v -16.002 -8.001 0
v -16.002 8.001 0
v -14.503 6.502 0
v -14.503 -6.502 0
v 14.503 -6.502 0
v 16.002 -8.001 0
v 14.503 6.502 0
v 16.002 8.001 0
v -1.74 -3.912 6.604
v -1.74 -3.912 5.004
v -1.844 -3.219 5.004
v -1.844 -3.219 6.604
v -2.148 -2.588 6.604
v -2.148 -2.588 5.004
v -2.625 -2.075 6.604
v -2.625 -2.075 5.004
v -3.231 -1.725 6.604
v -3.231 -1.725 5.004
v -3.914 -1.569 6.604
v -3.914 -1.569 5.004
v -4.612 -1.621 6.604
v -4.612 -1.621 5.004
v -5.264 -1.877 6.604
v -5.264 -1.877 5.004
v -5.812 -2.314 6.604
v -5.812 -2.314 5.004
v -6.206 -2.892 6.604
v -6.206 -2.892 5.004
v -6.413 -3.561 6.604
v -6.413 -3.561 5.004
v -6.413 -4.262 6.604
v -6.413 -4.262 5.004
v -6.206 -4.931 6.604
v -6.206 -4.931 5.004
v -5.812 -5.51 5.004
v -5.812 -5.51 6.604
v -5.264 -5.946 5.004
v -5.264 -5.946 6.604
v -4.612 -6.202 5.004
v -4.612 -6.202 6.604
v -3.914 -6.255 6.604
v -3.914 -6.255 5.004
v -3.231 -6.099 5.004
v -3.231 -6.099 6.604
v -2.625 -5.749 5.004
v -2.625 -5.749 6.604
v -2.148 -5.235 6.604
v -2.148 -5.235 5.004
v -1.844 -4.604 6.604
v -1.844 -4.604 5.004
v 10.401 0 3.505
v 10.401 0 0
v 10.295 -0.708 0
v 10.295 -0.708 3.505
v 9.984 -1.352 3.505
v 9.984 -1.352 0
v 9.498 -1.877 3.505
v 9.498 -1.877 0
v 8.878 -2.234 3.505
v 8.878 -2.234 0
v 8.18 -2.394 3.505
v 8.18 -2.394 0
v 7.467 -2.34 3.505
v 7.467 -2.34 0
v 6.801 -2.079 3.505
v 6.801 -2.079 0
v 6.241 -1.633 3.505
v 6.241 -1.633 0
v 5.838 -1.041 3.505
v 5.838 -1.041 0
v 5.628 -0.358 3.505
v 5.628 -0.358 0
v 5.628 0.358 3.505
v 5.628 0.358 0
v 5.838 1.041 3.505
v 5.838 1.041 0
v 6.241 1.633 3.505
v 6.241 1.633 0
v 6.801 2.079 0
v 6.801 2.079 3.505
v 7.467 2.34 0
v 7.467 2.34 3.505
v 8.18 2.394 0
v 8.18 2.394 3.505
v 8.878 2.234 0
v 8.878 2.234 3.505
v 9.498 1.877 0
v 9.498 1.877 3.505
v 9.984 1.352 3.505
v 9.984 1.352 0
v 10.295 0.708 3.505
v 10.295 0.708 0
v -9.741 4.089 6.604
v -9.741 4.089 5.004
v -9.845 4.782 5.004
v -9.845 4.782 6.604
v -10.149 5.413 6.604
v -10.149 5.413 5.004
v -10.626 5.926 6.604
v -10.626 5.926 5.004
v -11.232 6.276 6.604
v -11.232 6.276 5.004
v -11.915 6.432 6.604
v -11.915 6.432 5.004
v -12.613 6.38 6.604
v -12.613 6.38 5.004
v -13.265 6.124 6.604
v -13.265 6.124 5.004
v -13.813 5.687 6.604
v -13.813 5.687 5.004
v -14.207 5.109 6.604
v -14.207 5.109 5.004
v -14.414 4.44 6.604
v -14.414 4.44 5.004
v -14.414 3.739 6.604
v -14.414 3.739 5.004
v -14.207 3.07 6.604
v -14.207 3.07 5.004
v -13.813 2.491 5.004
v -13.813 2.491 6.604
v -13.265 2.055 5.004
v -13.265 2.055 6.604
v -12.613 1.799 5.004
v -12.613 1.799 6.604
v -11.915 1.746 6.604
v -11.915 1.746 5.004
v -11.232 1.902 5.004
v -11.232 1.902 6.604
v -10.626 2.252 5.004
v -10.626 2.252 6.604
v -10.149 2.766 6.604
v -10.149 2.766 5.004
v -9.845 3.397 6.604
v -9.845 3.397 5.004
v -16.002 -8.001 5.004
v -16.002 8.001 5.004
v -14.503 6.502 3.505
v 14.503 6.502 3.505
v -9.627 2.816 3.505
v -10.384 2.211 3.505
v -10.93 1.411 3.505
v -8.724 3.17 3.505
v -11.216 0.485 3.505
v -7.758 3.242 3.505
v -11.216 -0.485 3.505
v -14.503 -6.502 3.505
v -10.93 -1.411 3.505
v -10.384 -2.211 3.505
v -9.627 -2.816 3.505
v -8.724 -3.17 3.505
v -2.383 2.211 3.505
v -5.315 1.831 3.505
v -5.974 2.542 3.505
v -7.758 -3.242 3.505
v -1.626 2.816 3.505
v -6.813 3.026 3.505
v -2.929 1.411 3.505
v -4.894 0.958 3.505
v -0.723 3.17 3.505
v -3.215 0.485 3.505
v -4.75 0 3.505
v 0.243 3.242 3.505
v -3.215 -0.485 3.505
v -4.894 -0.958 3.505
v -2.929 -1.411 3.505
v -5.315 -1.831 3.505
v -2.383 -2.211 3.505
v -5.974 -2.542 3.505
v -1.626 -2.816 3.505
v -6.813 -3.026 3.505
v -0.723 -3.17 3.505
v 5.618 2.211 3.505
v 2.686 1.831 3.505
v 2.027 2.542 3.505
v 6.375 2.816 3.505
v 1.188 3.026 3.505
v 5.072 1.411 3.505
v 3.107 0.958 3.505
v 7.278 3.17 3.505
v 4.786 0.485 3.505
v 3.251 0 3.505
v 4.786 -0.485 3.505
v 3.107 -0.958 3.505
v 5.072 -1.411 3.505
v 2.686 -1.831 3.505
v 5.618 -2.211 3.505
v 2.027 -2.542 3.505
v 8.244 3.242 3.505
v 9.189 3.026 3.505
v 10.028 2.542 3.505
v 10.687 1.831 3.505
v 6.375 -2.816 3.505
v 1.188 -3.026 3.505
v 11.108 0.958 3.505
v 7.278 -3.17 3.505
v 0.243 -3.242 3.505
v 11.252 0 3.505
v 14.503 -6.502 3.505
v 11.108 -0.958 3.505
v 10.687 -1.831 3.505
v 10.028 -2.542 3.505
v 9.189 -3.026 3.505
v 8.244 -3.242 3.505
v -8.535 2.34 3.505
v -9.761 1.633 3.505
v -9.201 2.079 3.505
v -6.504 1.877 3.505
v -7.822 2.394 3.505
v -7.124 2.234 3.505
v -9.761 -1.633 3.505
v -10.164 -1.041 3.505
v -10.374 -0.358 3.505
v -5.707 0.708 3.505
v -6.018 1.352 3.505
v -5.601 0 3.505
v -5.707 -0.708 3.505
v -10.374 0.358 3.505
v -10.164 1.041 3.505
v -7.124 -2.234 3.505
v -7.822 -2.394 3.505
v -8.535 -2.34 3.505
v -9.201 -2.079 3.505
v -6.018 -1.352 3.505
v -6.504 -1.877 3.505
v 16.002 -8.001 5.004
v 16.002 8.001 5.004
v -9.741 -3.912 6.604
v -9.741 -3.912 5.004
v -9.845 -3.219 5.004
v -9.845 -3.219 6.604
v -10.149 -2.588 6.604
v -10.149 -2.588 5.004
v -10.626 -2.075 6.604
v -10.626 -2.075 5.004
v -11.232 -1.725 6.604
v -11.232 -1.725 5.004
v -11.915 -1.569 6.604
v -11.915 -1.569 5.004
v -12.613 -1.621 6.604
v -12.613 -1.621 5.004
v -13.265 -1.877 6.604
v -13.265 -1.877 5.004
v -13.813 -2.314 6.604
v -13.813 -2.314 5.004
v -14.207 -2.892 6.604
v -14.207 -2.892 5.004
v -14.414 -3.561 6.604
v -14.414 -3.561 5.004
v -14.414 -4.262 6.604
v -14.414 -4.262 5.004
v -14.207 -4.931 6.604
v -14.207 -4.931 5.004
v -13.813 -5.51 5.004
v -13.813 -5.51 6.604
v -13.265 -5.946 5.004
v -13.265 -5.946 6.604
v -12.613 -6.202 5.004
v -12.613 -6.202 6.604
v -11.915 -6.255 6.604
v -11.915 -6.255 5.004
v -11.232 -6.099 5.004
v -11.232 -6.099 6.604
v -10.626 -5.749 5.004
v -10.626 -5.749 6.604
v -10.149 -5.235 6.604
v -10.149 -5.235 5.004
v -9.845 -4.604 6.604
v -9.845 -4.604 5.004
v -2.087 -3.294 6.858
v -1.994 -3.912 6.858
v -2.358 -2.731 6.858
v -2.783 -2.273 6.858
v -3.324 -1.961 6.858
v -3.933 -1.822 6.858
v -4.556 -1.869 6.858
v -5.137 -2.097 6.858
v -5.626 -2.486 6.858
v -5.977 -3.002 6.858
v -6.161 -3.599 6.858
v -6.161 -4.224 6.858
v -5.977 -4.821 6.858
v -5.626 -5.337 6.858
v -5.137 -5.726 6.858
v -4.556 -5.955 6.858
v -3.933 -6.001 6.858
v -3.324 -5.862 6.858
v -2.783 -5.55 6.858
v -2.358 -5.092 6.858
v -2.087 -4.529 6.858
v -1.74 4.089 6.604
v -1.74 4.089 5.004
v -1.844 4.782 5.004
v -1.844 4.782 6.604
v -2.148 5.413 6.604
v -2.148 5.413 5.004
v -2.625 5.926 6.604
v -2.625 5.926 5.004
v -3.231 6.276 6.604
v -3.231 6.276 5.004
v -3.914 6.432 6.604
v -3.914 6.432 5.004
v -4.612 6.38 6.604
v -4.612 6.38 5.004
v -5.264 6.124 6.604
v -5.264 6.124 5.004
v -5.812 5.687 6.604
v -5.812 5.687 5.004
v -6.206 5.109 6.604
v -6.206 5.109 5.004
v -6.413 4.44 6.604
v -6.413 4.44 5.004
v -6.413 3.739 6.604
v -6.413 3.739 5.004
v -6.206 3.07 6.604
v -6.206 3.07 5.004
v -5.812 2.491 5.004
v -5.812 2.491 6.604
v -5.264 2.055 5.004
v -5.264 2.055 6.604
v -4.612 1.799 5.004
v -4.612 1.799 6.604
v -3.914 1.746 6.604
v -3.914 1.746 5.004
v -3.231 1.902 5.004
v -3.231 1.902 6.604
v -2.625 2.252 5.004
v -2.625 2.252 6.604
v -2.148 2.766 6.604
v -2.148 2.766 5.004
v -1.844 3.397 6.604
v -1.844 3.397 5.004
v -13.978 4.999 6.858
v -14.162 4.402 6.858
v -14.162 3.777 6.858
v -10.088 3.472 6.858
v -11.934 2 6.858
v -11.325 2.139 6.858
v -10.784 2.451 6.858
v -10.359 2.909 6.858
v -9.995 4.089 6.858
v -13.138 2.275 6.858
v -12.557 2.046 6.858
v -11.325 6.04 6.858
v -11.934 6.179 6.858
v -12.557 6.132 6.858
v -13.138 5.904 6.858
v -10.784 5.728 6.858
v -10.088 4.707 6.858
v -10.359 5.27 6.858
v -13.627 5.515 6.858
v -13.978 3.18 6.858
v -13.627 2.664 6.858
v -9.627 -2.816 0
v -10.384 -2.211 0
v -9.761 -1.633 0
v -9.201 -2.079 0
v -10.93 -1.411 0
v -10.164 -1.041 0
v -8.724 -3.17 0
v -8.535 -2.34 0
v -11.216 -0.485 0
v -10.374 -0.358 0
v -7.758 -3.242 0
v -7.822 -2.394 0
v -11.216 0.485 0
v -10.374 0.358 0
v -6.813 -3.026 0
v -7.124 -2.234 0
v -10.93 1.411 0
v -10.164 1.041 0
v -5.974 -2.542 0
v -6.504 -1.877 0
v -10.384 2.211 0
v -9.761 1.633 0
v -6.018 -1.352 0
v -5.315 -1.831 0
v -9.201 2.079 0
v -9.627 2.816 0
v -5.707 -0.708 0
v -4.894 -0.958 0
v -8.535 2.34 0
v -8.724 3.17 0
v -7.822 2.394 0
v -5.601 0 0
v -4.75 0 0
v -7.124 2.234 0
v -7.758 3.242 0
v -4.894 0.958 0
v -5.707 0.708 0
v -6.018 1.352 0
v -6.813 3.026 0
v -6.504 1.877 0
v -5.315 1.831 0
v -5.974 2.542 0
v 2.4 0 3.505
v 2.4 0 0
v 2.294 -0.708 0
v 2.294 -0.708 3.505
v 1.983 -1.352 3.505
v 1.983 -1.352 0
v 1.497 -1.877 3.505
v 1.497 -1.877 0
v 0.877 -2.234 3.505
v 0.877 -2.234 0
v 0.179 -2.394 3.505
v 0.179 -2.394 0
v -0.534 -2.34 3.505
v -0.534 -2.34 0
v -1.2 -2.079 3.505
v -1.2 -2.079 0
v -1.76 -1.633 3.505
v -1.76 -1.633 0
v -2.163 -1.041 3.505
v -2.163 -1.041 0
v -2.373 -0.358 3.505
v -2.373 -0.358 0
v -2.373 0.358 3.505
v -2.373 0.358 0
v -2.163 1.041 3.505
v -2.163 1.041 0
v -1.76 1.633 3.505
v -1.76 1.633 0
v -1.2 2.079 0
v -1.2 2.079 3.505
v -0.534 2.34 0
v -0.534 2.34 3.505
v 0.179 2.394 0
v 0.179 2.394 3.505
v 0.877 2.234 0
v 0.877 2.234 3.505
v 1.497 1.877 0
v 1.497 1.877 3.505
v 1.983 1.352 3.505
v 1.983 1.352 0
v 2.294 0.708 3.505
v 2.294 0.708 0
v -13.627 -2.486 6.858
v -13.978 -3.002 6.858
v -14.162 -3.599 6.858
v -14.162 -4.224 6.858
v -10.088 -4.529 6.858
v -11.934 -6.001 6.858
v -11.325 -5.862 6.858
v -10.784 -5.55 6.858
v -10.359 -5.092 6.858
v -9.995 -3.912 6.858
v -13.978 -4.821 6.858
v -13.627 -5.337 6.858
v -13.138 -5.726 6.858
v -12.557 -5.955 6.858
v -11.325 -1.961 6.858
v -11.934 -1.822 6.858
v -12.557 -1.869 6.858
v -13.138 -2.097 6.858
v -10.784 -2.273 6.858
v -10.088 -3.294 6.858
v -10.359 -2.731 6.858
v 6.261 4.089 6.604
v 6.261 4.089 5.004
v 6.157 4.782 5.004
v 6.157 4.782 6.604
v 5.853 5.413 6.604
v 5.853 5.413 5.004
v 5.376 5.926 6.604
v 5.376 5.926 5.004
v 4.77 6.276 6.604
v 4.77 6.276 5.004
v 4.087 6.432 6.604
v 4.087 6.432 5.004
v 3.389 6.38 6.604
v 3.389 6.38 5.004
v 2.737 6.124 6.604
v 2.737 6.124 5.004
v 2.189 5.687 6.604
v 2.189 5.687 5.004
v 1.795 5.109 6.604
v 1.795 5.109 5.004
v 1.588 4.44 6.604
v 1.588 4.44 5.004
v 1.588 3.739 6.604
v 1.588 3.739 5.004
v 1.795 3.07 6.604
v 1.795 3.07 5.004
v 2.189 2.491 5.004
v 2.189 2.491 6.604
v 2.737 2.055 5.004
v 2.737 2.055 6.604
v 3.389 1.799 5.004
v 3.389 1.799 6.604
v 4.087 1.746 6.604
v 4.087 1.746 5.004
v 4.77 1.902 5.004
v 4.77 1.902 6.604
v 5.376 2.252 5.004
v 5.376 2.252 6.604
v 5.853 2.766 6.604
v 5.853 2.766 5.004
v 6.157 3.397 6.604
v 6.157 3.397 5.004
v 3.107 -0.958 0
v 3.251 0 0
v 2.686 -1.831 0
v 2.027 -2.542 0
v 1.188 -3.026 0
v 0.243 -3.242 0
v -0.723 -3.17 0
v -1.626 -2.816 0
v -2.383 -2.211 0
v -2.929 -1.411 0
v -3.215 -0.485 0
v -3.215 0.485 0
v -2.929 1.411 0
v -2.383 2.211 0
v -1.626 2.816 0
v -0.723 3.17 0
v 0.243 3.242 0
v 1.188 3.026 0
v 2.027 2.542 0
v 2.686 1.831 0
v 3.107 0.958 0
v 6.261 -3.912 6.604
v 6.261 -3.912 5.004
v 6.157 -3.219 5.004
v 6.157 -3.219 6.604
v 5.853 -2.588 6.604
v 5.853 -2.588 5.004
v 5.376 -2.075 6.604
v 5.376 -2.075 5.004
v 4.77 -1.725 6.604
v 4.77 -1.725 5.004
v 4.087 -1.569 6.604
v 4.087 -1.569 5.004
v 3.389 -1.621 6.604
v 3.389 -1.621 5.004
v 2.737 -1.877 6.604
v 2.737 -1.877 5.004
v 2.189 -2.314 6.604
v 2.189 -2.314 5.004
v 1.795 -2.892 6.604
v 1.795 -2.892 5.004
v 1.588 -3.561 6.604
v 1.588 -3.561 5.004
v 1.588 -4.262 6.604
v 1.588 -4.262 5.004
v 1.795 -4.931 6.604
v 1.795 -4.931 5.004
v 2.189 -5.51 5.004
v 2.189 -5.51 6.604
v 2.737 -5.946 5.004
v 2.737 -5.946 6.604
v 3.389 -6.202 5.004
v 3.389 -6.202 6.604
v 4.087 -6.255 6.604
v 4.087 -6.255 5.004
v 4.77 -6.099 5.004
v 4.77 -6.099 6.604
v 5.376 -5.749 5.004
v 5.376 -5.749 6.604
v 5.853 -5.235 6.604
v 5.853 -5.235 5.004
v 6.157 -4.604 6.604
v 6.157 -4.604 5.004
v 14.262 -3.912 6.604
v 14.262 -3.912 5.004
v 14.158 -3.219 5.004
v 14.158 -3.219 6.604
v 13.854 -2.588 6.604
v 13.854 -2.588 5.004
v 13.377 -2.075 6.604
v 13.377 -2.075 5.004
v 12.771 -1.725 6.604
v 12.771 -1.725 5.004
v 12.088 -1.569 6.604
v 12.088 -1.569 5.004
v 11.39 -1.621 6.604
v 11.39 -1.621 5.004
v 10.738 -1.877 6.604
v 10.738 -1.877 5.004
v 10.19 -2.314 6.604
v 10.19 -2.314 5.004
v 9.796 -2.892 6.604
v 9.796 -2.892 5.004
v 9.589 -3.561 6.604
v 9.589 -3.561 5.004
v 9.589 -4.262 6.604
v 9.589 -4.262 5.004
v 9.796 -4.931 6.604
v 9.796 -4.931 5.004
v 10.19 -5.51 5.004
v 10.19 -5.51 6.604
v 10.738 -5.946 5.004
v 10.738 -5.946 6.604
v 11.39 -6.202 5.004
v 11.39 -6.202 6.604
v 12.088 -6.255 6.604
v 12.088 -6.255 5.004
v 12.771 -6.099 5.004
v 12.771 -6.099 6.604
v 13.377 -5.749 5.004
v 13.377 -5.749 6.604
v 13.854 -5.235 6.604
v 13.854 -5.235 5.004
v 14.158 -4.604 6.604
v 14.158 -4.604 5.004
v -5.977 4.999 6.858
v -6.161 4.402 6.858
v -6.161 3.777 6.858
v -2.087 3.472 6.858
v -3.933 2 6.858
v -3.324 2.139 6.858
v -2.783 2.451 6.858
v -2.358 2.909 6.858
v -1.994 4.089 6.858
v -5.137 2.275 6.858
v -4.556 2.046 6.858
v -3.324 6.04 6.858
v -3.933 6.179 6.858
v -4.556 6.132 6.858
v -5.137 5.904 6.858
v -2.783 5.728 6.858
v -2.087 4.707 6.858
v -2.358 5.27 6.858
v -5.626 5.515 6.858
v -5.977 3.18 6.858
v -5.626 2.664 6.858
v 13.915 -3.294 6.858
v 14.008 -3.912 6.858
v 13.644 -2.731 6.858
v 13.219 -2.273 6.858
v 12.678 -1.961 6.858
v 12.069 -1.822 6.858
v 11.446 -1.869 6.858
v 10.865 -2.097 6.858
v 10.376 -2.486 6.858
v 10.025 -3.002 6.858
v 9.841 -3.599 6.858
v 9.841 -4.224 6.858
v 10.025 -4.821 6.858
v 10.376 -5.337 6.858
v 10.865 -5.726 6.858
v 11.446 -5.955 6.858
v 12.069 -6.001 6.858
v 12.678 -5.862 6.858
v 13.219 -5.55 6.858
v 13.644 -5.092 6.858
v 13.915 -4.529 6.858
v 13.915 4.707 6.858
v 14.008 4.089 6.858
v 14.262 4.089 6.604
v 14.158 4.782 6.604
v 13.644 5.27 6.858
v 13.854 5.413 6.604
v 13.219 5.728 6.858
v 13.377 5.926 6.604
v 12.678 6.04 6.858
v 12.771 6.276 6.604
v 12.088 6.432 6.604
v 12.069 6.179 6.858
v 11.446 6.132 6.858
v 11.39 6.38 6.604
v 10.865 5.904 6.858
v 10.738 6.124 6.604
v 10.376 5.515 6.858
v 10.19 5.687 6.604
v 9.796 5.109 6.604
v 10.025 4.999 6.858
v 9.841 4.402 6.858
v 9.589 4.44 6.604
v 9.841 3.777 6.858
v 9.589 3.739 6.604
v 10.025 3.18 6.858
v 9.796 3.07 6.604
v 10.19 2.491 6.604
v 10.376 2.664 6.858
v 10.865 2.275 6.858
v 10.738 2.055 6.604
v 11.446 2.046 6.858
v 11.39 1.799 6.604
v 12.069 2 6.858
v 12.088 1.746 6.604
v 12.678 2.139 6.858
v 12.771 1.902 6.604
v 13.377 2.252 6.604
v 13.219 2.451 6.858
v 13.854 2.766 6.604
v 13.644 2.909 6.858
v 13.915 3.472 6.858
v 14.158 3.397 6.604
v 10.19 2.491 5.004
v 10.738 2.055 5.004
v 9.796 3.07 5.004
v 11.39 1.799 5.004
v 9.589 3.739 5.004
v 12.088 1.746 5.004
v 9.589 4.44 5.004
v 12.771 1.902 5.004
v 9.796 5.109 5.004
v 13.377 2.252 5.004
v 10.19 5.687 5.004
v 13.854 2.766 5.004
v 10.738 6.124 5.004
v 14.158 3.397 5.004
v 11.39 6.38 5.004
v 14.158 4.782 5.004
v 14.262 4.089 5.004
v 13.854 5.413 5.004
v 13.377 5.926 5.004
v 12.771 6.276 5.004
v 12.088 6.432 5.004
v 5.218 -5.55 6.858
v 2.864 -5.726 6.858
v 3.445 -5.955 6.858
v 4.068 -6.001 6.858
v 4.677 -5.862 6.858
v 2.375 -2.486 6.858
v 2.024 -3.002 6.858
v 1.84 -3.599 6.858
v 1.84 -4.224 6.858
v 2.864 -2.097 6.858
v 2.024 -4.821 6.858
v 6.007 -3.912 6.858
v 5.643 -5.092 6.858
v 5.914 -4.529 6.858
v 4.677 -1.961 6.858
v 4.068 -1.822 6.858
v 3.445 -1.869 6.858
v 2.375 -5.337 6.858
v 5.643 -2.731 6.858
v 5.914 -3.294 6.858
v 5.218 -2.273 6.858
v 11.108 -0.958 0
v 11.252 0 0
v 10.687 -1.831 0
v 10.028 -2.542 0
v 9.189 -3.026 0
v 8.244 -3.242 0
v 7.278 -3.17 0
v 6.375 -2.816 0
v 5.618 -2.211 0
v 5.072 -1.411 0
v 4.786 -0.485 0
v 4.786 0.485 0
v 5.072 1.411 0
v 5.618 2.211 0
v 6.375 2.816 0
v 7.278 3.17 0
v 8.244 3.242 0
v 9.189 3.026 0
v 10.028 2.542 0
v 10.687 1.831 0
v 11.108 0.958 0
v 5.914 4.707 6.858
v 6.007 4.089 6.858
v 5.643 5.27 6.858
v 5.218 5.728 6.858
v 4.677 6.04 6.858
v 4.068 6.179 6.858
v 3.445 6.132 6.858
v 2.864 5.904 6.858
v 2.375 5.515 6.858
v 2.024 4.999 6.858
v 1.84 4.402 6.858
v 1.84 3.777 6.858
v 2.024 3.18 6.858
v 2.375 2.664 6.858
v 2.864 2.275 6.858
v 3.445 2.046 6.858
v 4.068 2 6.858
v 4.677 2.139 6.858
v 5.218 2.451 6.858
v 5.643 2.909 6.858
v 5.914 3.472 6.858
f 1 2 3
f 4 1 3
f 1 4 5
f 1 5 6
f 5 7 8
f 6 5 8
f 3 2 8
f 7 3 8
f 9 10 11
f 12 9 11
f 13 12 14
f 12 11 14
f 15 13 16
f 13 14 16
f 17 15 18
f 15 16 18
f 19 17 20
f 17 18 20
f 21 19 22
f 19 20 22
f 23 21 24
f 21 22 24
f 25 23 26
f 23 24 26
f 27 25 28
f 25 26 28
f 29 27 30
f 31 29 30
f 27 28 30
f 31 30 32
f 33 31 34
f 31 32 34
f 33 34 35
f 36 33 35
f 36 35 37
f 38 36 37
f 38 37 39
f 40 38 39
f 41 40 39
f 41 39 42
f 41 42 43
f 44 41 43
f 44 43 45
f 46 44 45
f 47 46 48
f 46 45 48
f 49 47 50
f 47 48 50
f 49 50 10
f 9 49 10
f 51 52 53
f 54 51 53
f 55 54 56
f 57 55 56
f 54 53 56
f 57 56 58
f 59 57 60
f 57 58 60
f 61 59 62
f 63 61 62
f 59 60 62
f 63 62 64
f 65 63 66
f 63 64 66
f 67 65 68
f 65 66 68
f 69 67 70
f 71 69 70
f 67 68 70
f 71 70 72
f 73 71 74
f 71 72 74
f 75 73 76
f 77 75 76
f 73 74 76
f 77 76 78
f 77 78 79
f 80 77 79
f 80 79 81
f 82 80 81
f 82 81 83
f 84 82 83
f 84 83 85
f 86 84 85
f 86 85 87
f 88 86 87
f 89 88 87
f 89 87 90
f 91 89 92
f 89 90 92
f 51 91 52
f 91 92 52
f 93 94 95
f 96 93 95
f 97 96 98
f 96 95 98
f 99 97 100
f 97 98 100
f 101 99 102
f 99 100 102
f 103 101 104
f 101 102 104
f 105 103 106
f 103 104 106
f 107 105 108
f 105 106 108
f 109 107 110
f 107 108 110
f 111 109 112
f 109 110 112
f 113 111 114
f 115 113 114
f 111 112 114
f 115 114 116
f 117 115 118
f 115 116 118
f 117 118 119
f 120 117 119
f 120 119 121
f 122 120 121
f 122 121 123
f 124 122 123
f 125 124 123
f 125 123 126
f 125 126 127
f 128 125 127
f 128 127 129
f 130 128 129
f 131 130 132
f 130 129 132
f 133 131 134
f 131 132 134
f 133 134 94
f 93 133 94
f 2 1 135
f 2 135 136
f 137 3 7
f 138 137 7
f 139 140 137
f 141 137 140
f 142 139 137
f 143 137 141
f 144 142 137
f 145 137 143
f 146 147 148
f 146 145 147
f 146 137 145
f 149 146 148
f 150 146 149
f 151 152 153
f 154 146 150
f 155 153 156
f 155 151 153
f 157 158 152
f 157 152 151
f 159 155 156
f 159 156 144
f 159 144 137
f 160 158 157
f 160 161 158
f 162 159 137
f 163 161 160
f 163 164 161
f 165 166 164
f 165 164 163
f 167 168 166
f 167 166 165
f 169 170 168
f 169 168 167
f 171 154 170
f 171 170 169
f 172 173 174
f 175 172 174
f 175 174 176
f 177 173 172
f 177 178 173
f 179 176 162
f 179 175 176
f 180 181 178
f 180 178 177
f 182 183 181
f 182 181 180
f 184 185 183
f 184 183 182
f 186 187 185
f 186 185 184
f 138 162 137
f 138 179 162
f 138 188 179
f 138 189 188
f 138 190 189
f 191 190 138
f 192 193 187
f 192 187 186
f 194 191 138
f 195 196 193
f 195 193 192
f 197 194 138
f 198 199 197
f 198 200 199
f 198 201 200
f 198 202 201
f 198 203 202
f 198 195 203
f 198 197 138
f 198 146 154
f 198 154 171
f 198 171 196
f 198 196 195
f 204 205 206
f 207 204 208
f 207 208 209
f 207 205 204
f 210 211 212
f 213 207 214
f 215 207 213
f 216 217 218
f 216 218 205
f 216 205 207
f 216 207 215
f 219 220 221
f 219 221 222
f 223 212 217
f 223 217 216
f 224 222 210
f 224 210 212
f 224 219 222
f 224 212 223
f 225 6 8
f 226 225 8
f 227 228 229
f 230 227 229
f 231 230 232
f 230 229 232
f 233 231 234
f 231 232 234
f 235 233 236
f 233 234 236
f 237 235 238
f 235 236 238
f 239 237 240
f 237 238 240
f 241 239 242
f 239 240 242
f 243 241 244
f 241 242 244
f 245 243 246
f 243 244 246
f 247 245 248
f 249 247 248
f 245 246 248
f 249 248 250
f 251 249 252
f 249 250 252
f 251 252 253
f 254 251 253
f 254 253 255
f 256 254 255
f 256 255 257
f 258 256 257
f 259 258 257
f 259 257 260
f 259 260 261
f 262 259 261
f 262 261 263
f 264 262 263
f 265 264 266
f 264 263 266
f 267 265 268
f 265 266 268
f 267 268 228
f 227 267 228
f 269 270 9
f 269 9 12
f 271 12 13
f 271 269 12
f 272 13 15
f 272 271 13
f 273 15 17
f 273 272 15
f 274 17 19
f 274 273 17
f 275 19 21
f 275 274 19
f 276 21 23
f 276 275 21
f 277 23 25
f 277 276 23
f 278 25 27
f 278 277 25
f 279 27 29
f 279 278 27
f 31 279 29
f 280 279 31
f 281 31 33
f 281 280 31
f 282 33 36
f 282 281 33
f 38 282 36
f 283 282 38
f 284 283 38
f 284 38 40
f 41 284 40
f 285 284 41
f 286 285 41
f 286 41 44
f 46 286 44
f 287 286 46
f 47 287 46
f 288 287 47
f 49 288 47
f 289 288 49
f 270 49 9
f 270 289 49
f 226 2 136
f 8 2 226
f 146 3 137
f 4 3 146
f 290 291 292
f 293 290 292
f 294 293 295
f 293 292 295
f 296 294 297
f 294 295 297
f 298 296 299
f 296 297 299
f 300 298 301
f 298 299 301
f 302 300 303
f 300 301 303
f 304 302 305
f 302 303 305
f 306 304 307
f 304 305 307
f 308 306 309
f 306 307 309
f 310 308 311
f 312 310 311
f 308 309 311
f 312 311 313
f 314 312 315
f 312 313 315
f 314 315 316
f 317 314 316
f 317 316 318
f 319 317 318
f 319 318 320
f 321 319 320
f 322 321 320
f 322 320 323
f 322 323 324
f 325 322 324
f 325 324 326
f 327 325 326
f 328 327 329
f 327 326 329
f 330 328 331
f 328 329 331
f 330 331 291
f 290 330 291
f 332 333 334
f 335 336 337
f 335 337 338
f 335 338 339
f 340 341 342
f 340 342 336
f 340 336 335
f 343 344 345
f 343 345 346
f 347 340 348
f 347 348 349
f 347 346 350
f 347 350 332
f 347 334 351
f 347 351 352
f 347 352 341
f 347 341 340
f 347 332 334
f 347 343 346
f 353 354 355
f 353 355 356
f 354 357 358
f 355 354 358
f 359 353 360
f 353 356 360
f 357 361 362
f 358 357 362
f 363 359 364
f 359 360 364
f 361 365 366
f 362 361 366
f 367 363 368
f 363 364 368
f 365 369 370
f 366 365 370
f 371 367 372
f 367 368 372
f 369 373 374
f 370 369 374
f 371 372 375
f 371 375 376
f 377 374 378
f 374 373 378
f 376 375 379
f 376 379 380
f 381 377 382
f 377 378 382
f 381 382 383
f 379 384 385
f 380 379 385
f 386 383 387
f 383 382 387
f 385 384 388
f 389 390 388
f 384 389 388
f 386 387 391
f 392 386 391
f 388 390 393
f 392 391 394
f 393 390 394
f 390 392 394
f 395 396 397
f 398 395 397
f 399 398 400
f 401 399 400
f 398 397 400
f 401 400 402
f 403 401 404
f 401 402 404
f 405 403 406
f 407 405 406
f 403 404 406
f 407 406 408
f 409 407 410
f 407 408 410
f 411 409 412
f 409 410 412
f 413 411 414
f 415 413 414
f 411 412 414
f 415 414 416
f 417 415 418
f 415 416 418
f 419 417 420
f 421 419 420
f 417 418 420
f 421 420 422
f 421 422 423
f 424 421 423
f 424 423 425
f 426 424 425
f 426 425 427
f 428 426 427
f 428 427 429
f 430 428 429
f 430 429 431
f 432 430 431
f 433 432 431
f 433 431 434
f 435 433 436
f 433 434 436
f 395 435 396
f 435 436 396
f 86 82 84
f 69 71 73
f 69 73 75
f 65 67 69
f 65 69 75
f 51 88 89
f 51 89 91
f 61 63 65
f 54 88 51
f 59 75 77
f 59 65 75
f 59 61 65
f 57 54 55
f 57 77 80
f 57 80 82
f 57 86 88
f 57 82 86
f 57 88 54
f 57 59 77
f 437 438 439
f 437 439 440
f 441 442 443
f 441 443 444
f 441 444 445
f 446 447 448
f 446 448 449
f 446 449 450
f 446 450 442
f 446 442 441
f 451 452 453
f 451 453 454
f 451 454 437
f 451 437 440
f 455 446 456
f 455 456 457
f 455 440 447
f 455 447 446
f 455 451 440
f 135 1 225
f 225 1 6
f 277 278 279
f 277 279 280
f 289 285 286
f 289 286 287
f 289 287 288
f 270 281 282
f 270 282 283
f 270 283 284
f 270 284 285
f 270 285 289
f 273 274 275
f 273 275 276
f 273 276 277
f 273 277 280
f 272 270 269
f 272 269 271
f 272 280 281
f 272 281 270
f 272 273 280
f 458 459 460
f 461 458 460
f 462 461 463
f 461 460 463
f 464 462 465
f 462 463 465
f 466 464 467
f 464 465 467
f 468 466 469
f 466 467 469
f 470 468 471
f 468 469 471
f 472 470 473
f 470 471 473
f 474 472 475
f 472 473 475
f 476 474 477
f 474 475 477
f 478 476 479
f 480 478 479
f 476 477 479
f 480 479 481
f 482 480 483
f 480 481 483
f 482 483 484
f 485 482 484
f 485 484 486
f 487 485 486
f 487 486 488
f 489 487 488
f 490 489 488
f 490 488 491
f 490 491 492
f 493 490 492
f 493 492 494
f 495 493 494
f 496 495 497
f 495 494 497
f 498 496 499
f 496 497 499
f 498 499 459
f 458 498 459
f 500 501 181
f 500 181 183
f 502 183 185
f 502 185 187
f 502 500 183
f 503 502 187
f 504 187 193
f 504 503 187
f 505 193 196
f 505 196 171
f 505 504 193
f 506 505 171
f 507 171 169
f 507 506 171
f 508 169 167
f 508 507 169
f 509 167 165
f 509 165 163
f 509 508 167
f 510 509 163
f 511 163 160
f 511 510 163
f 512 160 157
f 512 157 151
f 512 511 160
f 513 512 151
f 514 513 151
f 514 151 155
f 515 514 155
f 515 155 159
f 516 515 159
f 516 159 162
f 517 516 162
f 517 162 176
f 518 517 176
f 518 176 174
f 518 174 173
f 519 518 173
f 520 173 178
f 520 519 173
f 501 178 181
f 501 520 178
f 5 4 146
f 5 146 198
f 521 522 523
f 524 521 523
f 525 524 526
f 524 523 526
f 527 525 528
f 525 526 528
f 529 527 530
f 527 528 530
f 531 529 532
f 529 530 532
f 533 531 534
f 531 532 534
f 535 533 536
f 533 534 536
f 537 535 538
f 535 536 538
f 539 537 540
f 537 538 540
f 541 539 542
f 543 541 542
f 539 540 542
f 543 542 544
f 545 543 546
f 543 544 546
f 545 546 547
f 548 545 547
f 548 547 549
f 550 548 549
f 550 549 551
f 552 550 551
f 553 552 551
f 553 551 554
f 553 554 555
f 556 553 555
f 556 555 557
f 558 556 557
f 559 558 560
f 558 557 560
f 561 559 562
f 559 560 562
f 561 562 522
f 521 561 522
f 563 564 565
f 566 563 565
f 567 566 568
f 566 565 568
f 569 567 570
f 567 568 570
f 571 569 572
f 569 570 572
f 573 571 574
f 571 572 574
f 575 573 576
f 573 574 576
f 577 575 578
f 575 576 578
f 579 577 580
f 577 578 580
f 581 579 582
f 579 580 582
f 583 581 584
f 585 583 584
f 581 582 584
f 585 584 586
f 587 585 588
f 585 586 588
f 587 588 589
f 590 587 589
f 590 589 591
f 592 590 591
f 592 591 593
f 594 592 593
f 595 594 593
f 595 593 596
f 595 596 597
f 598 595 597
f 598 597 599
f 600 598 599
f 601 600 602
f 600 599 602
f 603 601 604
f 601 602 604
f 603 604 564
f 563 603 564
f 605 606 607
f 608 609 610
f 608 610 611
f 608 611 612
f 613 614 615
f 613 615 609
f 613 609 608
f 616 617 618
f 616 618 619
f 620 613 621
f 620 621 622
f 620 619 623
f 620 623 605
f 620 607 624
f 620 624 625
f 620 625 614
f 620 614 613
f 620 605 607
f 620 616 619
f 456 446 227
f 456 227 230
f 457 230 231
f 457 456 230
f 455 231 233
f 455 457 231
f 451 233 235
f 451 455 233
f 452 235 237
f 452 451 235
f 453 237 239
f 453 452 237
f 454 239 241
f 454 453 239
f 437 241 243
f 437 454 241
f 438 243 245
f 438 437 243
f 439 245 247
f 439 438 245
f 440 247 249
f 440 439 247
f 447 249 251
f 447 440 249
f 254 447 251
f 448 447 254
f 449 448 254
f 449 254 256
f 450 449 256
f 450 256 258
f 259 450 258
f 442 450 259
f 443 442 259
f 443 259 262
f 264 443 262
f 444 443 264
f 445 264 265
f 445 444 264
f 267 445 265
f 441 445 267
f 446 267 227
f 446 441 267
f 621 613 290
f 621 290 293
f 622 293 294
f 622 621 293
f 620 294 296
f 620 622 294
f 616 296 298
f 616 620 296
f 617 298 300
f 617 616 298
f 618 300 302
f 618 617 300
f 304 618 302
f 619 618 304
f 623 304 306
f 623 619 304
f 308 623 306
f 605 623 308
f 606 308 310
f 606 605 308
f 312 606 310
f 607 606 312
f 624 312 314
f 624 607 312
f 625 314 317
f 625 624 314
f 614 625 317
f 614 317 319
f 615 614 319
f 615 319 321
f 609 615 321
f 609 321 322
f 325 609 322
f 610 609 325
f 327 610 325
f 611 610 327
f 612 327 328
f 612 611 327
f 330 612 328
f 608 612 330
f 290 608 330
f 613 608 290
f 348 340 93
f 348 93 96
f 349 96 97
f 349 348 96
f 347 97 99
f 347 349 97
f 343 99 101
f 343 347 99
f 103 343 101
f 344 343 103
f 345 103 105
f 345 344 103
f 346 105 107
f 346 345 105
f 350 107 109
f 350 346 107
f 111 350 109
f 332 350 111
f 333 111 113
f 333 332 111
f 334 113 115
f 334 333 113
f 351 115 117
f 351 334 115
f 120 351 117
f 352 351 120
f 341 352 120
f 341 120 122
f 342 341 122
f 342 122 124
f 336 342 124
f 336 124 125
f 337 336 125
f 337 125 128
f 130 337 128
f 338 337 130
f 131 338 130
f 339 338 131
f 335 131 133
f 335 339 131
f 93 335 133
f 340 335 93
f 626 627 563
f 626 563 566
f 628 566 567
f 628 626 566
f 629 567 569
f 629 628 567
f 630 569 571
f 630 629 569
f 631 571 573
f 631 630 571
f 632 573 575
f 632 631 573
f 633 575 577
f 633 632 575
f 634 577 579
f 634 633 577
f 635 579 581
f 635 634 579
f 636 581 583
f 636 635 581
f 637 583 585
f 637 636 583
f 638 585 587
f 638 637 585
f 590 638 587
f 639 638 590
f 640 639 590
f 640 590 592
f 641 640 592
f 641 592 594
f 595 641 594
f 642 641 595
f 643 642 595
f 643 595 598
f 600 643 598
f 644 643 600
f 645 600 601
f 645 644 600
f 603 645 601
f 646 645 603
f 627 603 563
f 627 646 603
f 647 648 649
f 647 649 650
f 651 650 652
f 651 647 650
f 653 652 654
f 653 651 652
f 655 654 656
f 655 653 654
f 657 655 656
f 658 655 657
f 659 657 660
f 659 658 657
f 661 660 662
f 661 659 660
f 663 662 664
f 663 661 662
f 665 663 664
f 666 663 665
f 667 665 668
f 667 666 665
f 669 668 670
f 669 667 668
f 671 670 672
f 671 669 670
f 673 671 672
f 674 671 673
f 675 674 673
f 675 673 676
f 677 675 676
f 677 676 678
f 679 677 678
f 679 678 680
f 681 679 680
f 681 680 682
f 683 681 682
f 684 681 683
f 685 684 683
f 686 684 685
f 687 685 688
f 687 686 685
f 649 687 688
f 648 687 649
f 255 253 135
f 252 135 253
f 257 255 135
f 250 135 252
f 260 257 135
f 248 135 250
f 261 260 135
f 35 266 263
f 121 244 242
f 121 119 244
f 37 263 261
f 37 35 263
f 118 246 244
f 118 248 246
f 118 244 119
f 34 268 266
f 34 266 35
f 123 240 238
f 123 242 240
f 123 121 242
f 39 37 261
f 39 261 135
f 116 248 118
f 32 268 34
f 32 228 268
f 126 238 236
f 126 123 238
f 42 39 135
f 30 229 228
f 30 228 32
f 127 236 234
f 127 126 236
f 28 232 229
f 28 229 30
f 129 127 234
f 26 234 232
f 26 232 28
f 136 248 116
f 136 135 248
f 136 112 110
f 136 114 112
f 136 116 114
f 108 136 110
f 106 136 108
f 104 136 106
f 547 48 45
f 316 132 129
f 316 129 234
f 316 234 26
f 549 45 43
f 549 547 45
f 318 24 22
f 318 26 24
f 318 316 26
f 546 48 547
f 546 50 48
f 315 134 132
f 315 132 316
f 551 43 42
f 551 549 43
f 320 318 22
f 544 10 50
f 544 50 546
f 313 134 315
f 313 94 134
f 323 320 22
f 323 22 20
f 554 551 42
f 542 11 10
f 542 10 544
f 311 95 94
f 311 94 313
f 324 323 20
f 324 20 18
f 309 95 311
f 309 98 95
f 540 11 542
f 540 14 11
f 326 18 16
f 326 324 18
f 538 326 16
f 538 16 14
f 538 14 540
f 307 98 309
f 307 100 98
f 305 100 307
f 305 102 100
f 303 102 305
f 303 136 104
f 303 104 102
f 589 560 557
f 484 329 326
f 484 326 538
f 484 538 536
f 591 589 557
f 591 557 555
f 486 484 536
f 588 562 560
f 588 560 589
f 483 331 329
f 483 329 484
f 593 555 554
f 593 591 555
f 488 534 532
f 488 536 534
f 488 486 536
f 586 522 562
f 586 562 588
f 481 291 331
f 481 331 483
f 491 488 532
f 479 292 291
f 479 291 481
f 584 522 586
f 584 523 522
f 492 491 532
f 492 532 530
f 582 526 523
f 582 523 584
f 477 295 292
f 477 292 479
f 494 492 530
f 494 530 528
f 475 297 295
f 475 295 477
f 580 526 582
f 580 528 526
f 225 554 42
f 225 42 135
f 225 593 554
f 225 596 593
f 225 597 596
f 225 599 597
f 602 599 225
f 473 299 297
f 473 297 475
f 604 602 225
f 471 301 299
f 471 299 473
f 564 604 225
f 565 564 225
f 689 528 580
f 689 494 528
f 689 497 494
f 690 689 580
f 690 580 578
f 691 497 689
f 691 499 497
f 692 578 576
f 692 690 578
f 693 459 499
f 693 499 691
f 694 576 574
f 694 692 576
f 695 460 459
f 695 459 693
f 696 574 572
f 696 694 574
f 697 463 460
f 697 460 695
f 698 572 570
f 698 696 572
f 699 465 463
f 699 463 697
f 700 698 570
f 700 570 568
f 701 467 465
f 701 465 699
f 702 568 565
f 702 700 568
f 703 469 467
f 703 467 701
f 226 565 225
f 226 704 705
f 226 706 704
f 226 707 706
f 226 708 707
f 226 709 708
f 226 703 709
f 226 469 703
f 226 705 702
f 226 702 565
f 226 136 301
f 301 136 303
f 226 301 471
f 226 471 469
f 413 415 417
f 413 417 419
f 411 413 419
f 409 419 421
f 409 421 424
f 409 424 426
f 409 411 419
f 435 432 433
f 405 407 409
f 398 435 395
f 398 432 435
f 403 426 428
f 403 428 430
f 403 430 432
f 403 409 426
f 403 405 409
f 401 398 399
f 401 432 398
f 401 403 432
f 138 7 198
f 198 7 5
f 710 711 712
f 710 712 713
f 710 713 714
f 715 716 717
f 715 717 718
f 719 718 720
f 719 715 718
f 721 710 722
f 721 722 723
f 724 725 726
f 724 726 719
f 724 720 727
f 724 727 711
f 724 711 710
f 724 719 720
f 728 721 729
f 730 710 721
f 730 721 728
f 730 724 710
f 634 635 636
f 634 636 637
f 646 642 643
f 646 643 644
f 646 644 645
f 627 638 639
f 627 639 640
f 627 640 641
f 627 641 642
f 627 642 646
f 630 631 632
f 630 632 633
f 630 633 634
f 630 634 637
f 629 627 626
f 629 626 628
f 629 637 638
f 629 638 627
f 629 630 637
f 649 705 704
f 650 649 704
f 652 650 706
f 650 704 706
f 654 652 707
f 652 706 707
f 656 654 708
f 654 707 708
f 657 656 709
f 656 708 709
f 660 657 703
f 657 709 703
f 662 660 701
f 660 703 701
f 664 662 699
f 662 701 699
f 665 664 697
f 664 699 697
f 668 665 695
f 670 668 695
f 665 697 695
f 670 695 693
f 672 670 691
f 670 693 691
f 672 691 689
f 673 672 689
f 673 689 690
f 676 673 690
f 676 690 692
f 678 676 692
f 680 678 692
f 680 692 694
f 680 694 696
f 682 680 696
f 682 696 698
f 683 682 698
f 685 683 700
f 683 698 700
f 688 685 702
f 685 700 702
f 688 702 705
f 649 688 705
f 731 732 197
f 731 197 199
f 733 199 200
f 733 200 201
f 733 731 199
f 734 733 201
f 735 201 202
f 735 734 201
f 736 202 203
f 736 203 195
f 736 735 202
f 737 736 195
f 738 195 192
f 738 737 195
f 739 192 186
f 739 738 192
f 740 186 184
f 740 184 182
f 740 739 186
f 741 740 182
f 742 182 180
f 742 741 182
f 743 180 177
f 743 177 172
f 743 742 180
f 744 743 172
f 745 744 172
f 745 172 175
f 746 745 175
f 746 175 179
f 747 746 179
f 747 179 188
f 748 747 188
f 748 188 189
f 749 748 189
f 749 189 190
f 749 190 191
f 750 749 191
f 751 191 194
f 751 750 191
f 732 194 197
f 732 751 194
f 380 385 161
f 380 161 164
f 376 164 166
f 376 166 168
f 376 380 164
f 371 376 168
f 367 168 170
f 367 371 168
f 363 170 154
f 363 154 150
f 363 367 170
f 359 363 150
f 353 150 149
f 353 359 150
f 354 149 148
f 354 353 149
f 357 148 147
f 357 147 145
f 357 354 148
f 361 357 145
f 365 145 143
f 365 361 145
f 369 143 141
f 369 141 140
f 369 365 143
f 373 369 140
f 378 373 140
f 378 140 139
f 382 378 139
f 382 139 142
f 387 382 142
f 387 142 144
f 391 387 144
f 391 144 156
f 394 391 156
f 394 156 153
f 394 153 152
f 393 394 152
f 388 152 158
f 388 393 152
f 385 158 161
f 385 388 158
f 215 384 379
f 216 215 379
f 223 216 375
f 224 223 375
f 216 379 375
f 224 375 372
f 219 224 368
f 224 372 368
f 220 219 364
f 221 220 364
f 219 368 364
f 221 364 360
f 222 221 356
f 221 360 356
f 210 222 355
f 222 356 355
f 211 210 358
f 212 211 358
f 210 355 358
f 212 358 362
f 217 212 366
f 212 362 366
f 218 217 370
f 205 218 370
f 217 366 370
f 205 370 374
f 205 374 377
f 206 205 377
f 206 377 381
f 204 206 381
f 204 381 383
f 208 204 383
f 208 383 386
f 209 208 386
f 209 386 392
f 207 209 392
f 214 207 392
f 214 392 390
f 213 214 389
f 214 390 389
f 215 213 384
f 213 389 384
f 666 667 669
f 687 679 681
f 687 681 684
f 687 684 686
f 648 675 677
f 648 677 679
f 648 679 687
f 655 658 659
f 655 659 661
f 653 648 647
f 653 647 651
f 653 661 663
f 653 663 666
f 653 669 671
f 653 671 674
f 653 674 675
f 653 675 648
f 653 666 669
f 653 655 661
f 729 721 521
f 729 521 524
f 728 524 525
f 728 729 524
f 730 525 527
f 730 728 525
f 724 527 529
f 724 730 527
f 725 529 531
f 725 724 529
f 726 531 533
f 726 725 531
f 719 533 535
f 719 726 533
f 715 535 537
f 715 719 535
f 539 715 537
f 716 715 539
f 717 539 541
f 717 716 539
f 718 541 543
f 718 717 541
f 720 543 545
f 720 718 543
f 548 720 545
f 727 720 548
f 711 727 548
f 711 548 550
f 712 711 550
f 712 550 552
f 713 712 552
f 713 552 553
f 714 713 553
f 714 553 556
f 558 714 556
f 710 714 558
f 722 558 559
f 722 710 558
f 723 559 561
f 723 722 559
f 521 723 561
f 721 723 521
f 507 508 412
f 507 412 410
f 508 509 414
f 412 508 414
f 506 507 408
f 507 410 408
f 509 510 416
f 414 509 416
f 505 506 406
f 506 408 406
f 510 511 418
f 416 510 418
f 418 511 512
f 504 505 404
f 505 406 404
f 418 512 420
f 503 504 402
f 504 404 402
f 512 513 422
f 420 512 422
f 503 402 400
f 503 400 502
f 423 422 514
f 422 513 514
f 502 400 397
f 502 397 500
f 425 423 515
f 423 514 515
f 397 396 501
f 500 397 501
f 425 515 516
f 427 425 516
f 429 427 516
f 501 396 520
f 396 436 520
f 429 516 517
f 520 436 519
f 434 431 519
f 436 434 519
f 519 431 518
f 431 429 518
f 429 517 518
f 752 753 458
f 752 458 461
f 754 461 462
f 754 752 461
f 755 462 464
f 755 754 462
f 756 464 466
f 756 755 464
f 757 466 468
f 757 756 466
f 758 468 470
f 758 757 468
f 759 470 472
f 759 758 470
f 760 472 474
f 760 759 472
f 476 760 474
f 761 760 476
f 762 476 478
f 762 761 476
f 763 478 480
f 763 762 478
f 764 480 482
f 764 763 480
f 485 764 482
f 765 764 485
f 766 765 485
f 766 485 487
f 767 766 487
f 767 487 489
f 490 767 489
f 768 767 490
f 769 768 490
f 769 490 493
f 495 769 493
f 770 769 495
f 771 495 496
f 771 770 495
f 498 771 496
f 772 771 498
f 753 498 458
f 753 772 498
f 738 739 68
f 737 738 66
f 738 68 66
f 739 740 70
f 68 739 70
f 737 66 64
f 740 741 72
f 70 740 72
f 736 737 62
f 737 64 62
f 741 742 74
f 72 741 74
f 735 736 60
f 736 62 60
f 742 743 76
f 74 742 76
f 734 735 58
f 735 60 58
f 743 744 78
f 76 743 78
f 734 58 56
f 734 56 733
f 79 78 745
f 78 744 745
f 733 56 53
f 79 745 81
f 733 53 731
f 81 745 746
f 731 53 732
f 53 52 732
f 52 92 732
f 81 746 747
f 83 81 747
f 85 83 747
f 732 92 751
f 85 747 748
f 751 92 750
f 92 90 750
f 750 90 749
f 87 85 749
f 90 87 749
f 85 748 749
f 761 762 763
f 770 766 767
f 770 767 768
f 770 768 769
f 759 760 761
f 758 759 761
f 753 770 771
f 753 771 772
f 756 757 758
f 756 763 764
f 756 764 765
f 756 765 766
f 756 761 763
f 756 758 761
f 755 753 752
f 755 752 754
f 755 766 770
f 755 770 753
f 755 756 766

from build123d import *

# Parameters (mm, degrees)
F0_W     = 32.004
F0_H     = 16.002
F1_DEPTH = 5.0038
F2_R     = 2.3495
F3_DEPTH = 1.8542
F4_W     = 29.0068
F4_H     = 13.0048
F4_R     = 3.2512
F4_R_2   = 2.4003
F5_DEPTH = 3.5052
F6_SIZE  = 0.254


with BuildPart() as f1:
    # F0 (on Top) → F1 (new body)
    with BuildSketch(Plane.XY):
        Rectangle(F0_W, F0_H)
    extrude(amount=F1_DEPTH)

    # F2 (on face) → F3 (join)
    with BuildSketch(Plane.XY.offset(5.0038)):
        with Locations((-12.0904, 4.0894)):
            Circle(F2_R)
        with Locations((-12.0904, -3.9116)):
            Circle(F2_R)
        with Locations((-4.0894, 4.0894)):
            Circle(F2_R)
        with Locations((-4.0894, -3.9116)):
            Circle(F2_R)
        with Locations((3.9116, 4.0894)):
            Circle(F2_R)
        with Locations((3.9116, -3.9116)):
            Circle(F2_R)
        with Locations((11.9126, 4.0894)):
            Circle(F2_R)
        with Locations((11.9126, -3.9116)):
            Circle(F2_R)
    extrude(amount=F3_DEPTH)

    # F4 (on face) → F5 (cut)
    with BuildSketch(Plane(origin=(0, 0, 0), x_dir=(1, 0, 0), z_dir=(0, 0, -1))):
        Rectangle(F4_W, F4_H)
        with Locations((-8.001, 0)):
            Circle(F4_R, mode=Mode.SUBTRACT)
        Circle(F4_R, mode=Mode.SUBTRACT)
        with Locations((8.001, 0)):
            Circle(F4_R, mode=Mode.SUBTRACT)
        with Locations((-8.001, 0)):
            Circle(F4_R_2)
        with Locations((8.001, 0)):
            Circle(F4_R_2)
        Circle(F4_R_2)
    extrude(amount=-F5_DEPTH, mode=Mode.SUBTRACT)

    # F6
    f6_edges = [f1.edges().sort_by_distance(p)[0] for p in [
        (-14.4399, 4.0894, 6.858),
        (-14.4399, -3.9116, 6.858),
        (-6.4389, -3.9116, 6.858),
        (-6.4389, 4.0894, 6.858),
        (1.5621, 4.0894, 6.858),
        (1.5621, -3.9116, 6.858),
        (9.5631, -3.9116, 6.858),
        (9.5631, 4.0894, 6.858),
    ]]
    chamfer(f6_edges, length=F6_SIZE)


solid = f1.part
